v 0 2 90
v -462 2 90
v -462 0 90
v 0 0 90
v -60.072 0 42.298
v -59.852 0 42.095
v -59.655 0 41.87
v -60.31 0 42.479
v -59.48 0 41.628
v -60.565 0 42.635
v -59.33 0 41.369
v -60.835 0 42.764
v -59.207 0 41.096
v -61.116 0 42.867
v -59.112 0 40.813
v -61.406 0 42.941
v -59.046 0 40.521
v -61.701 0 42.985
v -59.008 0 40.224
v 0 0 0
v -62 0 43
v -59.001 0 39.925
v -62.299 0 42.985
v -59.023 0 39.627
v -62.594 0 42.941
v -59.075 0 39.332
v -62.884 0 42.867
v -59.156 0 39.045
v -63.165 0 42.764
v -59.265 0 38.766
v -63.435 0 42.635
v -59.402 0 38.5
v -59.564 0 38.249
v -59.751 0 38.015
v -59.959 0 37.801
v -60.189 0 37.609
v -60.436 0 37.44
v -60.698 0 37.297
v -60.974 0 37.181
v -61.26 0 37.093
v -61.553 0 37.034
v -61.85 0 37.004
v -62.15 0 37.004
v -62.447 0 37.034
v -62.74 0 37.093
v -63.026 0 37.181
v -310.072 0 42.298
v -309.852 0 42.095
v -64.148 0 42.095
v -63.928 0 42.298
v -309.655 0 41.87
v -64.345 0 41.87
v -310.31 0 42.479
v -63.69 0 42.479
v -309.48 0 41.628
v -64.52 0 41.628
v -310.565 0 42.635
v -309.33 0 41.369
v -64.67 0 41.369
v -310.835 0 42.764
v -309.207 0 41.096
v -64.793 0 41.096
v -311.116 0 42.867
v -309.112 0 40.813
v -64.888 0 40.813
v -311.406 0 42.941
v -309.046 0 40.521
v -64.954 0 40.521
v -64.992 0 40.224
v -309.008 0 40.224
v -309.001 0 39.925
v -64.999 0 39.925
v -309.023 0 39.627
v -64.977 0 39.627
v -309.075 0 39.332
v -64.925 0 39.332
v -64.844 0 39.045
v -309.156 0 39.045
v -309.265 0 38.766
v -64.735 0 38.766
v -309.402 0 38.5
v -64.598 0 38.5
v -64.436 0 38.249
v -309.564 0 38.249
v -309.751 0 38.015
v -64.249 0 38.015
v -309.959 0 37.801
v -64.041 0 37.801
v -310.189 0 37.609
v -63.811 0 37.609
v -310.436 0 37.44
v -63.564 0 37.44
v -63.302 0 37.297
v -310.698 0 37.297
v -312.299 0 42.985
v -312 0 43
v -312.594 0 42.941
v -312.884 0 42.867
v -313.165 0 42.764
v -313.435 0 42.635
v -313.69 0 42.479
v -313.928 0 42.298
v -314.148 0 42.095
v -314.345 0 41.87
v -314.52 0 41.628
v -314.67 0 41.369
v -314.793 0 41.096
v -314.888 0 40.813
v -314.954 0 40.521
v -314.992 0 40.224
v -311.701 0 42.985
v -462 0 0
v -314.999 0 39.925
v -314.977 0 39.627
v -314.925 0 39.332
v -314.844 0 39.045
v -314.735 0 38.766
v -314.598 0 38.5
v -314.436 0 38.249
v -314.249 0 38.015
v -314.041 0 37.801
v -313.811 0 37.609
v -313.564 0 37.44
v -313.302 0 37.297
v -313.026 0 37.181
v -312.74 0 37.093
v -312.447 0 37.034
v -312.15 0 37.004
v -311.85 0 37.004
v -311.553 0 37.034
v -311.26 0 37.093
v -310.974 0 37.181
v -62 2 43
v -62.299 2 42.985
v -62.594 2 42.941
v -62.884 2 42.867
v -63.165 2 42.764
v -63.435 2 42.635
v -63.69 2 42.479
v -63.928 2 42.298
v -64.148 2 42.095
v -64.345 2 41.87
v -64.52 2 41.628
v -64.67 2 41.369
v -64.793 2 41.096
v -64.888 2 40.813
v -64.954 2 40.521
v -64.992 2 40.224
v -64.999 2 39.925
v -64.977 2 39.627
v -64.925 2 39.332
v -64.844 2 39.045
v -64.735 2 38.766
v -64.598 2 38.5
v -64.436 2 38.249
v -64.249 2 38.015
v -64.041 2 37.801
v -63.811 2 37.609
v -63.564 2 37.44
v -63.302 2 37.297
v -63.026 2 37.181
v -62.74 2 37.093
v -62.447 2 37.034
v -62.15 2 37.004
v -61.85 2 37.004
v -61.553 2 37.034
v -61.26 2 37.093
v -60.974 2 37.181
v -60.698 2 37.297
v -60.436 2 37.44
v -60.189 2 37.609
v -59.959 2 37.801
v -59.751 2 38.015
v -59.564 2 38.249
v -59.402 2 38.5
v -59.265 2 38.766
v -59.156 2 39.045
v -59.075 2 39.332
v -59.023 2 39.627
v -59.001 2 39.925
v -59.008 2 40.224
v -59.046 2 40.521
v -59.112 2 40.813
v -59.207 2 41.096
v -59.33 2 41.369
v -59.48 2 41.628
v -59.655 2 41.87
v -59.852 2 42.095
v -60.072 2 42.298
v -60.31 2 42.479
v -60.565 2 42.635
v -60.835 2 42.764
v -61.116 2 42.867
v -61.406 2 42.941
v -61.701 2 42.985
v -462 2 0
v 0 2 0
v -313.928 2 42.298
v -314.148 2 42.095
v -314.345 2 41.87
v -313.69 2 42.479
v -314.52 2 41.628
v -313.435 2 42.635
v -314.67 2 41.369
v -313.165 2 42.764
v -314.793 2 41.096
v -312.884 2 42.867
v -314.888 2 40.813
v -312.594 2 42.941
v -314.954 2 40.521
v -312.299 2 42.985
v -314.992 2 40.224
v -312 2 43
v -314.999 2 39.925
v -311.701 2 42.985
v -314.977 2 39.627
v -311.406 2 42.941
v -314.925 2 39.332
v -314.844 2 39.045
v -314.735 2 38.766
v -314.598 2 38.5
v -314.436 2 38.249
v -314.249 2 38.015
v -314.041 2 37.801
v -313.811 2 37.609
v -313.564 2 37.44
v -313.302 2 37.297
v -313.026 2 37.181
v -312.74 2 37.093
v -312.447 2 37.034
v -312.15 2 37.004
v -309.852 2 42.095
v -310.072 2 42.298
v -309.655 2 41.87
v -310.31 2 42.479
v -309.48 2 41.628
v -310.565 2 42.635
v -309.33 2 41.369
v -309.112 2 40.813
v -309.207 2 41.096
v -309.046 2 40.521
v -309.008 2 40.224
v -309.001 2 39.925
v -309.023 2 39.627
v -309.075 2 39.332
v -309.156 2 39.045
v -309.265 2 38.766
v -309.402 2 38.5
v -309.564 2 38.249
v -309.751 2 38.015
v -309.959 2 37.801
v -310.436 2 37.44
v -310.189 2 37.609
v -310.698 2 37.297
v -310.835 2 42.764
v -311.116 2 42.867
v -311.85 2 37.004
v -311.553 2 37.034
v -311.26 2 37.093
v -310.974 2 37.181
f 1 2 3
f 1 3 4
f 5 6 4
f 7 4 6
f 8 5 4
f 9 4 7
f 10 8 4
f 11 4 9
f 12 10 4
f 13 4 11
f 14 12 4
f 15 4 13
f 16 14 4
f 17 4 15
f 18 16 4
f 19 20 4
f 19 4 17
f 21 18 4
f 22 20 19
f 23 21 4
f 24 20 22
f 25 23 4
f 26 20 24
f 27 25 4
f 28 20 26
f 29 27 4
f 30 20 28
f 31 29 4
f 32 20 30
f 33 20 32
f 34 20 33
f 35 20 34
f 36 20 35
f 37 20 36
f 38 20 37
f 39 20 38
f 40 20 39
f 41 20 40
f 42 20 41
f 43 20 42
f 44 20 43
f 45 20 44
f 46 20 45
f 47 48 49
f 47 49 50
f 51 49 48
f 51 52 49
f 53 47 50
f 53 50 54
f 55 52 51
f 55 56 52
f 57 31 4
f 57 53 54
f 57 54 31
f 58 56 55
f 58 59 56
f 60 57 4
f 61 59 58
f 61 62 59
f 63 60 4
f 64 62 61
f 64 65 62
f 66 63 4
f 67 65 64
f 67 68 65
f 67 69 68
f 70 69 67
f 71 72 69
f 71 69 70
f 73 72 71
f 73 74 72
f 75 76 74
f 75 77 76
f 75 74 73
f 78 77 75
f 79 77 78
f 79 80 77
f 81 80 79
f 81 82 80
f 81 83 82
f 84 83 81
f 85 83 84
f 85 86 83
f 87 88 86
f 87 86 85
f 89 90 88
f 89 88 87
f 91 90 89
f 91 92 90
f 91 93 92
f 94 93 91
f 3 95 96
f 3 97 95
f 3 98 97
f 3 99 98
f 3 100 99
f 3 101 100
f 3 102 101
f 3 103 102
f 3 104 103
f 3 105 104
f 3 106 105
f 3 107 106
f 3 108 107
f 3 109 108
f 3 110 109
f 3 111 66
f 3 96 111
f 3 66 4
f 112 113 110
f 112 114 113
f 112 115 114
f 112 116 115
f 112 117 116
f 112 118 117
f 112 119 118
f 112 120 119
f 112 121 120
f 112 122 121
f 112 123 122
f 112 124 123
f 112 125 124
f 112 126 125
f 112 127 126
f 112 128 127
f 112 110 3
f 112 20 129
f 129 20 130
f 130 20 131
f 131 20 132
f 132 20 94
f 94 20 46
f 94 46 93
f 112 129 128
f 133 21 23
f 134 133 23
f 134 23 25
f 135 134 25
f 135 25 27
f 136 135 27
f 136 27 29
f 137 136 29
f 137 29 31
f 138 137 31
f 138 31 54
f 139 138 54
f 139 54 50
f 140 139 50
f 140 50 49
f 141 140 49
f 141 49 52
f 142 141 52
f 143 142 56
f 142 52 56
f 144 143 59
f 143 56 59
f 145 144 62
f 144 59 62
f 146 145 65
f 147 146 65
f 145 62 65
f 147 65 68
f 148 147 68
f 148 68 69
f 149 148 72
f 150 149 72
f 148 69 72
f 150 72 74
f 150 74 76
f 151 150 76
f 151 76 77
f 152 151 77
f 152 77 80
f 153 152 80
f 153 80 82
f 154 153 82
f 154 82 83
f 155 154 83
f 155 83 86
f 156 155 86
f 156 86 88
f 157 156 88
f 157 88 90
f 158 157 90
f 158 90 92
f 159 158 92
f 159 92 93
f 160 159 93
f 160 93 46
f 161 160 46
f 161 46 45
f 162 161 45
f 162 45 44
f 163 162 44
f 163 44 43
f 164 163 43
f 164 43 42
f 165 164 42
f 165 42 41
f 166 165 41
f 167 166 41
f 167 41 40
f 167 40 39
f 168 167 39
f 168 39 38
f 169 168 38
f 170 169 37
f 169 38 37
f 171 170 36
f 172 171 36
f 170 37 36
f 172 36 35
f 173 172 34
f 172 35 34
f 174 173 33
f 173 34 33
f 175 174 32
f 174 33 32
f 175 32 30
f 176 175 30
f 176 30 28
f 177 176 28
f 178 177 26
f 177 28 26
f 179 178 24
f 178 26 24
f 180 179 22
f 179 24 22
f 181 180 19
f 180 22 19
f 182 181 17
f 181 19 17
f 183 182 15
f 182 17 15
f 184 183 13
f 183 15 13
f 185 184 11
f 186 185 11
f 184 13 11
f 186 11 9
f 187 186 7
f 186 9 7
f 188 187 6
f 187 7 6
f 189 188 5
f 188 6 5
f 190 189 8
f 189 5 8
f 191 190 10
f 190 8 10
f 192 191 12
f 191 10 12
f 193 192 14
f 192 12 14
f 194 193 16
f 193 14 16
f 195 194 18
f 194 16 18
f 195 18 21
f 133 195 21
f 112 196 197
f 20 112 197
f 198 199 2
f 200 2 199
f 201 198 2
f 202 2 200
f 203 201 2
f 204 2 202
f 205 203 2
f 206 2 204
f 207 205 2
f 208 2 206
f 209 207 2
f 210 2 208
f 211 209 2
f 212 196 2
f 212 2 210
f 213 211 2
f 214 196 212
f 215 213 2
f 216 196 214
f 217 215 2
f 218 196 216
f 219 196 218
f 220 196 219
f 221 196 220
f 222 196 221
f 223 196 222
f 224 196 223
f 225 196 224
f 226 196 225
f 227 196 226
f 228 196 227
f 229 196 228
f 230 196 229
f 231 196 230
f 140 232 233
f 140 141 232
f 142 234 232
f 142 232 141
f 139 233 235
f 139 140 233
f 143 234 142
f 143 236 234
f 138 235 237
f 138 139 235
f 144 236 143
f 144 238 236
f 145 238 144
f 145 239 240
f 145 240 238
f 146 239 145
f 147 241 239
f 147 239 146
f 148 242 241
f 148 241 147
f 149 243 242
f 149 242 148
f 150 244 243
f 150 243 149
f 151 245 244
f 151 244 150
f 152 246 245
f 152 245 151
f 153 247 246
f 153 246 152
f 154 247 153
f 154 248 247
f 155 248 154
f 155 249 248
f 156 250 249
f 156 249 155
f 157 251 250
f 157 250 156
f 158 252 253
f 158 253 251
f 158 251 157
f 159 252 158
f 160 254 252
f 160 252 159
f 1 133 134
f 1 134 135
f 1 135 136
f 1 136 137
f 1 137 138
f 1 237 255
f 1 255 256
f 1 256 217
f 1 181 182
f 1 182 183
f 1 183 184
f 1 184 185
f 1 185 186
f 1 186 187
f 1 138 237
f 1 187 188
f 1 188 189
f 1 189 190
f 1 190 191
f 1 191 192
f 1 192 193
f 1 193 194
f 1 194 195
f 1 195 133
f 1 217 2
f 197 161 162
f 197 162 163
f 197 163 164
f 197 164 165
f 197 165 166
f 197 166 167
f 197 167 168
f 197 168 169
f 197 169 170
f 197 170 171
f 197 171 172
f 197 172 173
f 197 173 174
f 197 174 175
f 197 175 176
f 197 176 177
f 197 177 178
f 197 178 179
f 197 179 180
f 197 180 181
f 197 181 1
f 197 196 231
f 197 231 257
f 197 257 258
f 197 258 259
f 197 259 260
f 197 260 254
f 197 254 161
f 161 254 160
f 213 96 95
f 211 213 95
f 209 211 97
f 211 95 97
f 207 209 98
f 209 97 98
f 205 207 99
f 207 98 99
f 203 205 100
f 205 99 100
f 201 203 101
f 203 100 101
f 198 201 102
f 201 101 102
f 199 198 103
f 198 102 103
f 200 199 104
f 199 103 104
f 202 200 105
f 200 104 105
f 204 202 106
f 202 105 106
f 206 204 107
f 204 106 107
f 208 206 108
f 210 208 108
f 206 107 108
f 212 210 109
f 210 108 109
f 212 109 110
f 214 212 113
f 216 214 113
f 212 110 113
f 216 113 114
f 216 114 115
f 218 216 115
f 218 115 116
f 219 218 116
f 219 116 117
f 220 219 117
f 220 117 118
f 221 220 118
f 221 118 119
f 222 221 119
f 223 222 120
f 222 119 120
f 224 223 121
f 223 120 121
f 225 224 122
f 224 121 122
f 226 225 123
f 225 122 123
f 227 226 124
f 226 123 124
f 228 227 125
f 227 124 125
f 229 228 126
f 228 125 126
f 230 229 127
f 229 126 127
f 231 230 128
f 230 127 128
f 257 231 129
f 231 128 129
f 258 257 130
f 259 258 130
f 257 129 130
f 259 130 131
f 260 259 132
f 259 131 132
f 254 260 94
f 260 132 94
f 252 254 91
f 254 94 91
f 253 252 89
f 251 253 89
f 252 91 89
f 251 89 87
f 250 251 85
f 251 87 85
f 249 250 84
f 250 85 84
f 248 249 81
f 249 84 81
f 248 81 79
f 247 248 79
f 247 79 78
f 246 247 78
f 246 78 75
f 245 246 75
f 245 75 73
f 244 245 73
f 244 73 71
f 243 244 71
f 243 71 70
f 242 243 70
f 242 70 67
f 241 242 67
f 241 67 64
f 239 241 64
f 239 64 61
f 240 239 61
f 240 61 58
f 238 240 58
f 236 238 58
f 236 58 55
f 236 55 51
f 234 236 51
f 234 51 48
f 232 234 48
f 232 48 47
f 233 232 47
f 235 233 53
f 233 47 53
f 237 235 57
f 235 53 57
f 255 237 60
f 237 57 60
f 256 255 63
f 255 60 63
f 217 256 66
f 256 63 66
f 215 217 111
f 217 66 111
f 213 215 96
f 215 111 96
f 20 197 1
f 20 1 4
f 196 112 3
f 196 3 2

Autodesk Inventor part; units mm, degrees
ref_plane "YZ Plane" through (0, 0, 0) normal (1, 0, 0) x (0, 1, 0)
ref_plane "XZ Plane" through (0, 0, 0) normal (0, 1, 0) x (-1, 0, 0)
ref_plane "XY Plane" through (0, 0, 0) normal (0, 0, 1) x (1, 0, 0)
sketch "Sketch1" plane through (0, 0, 0) normal (0, 0, 1) x (1, 0, 0)
  line L0 (0, 0) -> (-462, 0)
  line L1 (-462, 0) -> (-462, 2)
  line L2 (-462, 2) -> (0, 2)
  line L3 (0, 2) -> (0, 0)
  dimension "d0" = 462
  dimension "d1" = 2
extrude "Extrusion1" add sketch "Sketch1" along normal blind 90
hole "Hole1" at (-312, 2, 40) direction (0, -1, 0) diameter 6 end through all
hole "Hole2" at (-62, 2, 40) direction (0, -1, 0) diameter 6 end through all
properties part number "Seitenteil_Einbau" material "PVC, Unplasticized"
